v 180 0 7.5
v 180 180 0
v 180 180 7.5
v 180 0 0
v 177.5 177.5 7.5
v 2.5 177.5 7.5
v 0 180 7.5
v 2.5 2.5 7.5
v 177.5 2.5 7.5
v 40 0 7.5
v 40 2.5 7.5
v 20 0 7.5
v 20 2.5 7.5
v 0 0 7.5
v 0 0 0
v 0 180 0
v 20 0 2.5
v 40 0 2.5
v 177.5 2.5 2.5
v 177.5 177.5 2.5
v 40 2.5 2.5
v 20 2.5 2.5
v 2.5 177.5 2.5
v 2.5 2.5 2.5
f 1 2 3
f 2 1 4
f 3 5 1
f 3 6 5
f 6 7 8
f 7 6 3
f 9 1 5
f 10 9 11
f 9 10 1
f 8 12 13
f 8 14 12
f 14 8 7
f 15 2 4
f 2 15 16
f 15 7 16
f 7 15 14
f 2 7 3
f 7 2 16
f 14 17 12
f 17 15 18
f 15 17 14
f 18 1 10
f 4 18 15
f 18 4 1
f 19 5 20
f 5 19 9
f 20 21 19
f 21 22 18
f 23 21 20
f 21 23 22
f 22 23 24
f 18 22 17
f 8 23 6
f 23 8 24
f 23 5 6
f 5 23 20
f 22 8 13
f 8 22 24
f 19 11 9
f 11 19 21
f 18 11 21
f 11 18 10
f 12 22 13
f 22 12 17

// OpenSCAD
$fn=128;

// housing dimensions
x = 180;
y = 180;
z = 2.5;
rise = 5;
wall = 2.5;
arduino = [20, 50, 10];

// button dimensions
r = 17;
gap = 1.5;

module button() {
    union() {
        difference() {
            cylinder(r = r, h = z);
            cylinder(r = r-gap, h = z);
            translate([-r/2, 0, 0]) cube([r, r, z]);
        }
        translate([r/2, .75*r, 0]) cube([gap, r, z]);
        translate([-r/2, .75*r, 0]) cube([gap, r, z]);
    }
}

module plate() {
    difference() {
        cube([x, y, z]);
       for ( dx = [0:3] ) {
           for (dy = [0:2]) {
            translate([dx*x/4+x/8, dy*y/3+y/8, 0]) button();
            }
           } 
        
    }
}

module housing() {
    difference() {
        cube([x, y, z + rise]);
        translate([wall, wall, z]) cube([x-2*wall, y-2*wall, rise]);
        translate([20, 0, z]) cube(arduino);
    }
}

module singleButtonPlate() {
    difference() {
        cube([2.8*r, 3.7*r, z]);
        translate([1.4*r, 1.4*r, 0]) button();        
    }
}

//button();
//plate();
housing();
